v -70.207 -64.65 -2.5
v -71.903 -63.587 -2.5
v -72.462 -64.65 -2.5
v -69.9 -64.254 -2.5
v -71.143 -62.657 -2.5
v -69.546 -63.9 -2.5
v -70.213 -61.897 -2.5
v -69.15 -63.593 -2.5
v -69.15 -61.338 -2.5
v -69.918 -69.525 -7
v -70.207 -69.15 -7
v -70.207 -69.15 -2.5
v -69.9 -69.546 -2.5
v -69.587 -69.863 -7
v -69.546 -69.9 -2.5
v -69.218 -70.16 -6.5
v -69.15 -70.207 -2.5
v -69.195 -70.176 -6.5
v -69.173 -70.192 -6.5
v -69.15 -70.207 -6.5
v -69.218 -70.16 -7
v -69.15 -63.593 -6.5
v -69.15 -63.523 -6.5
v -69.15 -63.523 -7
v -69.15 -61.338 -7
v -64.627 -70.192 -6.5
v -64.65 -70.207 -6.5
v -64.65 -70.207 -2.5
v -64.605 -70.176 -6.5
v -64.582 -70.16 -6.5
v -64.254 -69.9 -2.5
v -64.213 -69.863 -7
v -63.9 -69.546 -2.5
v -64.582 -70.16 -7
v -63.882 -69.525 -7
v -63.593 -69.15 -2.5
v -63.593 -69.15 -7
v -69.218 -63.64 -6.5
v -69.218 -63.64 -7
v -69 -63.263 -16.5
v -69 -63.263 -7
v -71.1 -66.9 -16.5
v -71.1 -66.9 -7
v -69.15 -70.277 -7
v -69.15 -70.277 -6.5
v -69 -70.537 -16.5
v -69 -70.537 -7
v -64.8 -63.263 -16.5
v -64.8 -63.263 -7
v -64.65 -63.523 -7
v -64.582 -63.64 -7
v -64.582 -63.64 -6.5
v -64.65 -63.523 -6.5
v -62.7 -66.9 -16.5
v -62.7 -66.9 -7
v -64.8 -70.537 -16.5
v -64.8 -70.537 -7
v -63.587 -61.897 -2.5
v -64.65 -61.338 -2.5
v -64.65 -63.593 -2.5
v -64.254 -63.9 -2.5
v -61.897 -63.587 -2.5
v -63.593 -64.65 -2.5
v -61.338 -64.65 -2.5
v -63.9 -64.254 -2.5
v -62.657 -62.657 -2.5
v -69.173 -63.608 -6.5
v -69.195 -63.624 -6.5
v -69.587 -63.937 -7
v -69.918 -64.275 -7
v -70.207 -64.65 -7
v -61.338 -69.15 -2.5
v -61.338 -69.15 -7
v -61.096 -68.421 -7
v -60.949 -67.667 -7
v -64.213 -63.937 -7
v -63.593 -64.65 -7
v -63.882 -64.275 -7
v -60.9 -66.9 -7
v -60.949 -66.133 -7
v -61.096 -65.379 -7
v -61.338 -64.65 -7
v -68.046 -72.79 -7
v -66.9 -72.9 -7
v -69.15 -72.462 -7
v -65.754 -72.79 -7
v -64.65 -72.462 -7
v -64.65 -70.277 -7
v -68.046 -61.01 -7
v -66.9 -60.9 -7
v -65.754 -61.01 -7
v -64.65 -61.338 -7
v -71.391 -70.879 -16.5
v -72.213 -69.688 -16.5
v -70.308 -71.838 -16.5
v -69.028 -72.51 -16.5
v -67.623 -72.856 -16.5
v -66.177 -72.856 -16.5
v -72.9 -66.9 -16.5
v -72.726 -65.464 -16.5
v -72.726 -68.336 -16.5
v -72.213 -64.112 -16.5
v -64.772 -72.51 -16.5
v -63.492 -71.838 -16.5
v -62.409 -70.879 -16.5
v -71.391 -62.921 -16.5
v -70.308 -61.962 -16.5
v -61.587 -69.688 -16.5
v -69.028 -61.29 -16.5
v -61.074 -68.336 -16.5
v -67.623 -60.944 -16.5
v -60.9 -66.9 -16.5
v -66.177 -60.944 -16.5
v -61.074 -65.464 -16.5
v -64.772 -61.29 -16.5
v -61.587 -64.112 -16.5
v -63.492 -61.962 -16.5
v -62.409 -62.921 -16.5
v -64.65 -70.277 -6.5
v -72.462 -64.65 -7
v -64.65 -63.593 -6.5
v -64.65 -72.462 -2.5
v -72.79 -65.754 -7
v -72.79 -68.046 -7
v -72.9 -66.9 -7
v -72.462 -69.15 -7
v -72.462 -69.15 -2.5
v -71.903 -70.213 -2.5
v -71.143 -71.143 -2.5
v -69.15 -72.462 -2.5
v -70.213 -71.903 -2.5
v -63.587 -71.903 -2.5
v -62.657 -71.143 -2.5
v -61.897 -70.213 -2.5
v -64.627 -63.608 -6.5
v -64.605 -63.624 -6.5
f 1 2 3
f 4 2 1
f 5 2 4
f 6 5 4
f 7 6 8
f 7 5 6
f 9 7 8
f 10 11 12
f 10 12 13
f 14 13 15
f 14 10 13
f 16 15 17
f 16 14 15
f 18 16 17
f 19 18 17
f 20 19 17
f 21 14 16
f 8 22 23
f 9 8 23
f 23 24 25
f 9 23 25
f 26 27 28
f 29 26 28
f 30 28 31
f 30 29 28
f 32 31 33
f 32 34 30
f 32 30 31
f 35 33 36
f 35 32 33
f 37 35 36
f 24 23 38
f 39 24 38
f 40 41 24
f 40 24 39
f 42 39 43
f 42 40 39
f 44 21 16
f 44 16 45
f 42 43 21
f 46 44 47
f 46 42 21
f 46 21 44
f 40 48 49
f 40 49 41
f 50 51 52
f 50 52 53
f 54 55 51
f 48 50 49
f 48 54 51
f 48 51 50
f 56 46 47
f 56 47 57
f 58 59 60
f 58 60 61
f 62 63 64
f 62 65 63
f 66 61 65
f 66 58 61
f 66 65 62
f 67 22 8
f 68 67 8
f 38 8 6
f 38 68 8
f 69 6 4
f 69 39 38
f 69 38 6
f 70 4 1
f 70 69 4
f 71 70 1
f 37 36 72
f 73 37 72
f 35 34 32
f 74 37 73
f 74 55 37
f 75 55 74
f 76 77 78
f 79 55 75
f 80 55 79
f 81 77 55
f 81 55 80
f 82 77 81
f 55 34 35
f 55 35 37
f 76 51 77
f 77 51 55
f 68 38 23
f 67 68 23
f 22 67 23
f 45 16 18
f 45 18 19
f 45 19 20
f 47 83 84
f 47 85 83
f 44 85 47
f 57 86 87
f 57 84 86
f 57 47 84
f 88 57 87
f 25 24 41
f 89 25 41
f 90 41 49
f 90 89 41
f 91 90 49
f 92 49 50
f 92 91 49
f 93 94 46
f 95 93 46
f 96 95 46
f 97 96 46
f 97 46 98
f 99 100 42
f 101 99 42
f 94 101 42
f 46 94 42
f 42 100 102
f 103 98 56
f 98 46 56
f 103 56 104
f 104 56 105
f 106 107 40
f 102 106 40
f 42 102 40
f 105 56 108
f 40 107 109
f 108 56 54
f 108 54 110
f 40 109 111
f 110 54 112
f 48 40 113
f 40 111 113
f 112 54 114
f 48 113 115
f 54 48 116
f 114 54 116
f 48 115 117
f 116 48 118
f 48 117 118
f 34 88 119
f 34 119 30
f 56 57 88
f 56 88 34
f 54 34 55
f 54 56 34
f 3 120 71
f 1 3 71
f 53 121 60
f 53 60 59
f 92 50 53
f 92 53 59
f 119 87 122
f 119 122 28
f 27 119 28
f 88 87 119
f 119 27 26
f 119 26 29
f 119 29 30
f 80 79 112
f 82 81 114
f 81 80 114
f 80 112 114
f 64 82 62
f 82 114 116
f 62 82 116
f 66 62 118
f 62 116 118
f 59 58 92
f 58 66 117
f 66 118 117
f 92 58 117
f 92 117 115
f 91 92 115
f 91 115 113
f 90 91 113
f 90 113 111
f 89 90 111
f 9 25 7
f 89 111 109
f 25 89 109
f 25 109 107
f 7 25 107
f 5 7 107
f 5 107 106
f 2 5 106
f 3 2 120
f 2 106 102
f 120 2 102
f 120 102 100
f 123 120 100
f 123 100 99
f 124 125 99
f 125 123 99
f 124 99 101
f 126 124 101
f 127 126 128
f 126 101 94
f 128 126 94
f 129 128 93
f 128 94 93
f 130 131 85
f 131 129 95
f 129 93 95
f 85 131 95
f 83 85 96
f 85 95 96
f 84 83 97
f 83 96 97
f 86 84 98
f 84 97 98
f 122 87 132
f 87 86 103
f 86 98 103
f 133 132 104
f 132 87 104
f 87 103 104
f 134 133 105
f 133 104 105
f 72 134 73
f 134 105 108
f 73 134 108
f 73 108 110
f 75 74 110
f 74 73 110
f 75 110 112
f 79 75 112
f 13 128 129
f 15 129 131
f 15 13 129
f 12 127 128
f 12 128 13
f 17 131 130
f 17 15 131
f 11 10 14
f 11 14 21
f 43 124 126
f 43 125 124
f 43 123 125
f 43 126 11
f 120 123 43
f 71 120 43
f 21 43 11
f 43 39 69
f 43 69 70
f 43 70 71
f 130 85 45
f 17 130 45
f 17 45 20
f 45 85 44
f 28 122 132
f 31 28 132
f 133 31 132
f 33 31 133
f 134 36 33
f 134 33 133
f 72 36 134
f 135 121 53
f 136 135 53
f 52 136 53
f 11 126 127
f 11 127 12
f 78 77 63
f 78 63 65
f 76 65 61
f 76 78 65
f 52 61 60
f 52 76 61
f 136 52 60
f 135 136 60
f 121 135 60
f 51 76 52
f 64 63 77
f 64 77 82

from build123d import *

# Parameters (mm, degrees)
CYLINDER019_R     = 4
CYLINDER019_DEPTH = 4.5
CUBE028_W         = 20
CUBE028_H         = 4.5
CUBE028_DEPTH     = 4.5
CUBE029_W         = 4.5
CUBE029_H         = 20
CUBE029_DEPTH     = 4.5
PRISM022_DEPTH    = 10
CYLINDER018_R     = 6
CYLINDER018_DEPTH = 14


with BuildPart() as cylinder019:
    # cylinder019 → cylinder019 (new body)
    with BuildSketch(Plane(origin=(-66.9, -66.9, -7), x_dir=(1, 0, 0), z_dir=(0, 0, 1))):
        Circle(CYLINDER019_R)
    extrude(amount=CYLINDER019_DEPTH)


with BuildPart() as cube028:
    # cube028 → cube028 (new body)
    with BuildSketch(Plane(origin=(-76.9, -69.15, -7), x_dir=(1, 0, 0), z_dir=(0, 0, 1))):
        with Locations((10, 2.25)):
            Rectangle(CUBE028_W, CUBE028_H)
    extrude(amount=CUBE028_DEPTH)


with BuildPart() as cube029:
    # cube029 → cube029 (new body)
    with BuildSketch(Plane(origin=(-69.15, -76.9, -7), x_dir=(1, 0, 0), z_dir=(0, 0, 1))):
        with Locations((2.25, 10)):
            Rectangle(CUBE029_W, CUBE029_H)
    extrude(amount=CUBE029_DEPTH)


with BuildPart() as group012:
    # prism022 → prism022 (new body)
    with BuildSketch(Plane(origin=(-66.9, -66.9, -16.5), x_dir=(1, 0, 0), z_dir=(0, 0, 1))):
        Polygon((4.2, 0), (2.1, 3.637307), (-2.1, 3.637307), (-4.2, 0), (-2.1, -3.637307), (2.1, -3.637307), align=None)
    extrude(amount=PRISM022_DEPTH)

    # Group012: union cylinder019, cube028, cube029
    add(cylinder019.part)
    add(cube028.part)
    add(cube029.part)


with BuildPart() as nut001:
    # cylinder018 → cylinder018 (new body)
    with BuildSketch(Plane(origin=(-66.9, -66.9, -16.5), x_dir=(1, 0, 0), z_dir=(0, 0, 1))):
        Circle(CYLINDER018_R)
    extrude(amount=CYLINDER018_DEPTH)

    # difference007: cut Group012
    add(group012.part, mode=Mode.SUBTRACT)


solid = nut001.part
